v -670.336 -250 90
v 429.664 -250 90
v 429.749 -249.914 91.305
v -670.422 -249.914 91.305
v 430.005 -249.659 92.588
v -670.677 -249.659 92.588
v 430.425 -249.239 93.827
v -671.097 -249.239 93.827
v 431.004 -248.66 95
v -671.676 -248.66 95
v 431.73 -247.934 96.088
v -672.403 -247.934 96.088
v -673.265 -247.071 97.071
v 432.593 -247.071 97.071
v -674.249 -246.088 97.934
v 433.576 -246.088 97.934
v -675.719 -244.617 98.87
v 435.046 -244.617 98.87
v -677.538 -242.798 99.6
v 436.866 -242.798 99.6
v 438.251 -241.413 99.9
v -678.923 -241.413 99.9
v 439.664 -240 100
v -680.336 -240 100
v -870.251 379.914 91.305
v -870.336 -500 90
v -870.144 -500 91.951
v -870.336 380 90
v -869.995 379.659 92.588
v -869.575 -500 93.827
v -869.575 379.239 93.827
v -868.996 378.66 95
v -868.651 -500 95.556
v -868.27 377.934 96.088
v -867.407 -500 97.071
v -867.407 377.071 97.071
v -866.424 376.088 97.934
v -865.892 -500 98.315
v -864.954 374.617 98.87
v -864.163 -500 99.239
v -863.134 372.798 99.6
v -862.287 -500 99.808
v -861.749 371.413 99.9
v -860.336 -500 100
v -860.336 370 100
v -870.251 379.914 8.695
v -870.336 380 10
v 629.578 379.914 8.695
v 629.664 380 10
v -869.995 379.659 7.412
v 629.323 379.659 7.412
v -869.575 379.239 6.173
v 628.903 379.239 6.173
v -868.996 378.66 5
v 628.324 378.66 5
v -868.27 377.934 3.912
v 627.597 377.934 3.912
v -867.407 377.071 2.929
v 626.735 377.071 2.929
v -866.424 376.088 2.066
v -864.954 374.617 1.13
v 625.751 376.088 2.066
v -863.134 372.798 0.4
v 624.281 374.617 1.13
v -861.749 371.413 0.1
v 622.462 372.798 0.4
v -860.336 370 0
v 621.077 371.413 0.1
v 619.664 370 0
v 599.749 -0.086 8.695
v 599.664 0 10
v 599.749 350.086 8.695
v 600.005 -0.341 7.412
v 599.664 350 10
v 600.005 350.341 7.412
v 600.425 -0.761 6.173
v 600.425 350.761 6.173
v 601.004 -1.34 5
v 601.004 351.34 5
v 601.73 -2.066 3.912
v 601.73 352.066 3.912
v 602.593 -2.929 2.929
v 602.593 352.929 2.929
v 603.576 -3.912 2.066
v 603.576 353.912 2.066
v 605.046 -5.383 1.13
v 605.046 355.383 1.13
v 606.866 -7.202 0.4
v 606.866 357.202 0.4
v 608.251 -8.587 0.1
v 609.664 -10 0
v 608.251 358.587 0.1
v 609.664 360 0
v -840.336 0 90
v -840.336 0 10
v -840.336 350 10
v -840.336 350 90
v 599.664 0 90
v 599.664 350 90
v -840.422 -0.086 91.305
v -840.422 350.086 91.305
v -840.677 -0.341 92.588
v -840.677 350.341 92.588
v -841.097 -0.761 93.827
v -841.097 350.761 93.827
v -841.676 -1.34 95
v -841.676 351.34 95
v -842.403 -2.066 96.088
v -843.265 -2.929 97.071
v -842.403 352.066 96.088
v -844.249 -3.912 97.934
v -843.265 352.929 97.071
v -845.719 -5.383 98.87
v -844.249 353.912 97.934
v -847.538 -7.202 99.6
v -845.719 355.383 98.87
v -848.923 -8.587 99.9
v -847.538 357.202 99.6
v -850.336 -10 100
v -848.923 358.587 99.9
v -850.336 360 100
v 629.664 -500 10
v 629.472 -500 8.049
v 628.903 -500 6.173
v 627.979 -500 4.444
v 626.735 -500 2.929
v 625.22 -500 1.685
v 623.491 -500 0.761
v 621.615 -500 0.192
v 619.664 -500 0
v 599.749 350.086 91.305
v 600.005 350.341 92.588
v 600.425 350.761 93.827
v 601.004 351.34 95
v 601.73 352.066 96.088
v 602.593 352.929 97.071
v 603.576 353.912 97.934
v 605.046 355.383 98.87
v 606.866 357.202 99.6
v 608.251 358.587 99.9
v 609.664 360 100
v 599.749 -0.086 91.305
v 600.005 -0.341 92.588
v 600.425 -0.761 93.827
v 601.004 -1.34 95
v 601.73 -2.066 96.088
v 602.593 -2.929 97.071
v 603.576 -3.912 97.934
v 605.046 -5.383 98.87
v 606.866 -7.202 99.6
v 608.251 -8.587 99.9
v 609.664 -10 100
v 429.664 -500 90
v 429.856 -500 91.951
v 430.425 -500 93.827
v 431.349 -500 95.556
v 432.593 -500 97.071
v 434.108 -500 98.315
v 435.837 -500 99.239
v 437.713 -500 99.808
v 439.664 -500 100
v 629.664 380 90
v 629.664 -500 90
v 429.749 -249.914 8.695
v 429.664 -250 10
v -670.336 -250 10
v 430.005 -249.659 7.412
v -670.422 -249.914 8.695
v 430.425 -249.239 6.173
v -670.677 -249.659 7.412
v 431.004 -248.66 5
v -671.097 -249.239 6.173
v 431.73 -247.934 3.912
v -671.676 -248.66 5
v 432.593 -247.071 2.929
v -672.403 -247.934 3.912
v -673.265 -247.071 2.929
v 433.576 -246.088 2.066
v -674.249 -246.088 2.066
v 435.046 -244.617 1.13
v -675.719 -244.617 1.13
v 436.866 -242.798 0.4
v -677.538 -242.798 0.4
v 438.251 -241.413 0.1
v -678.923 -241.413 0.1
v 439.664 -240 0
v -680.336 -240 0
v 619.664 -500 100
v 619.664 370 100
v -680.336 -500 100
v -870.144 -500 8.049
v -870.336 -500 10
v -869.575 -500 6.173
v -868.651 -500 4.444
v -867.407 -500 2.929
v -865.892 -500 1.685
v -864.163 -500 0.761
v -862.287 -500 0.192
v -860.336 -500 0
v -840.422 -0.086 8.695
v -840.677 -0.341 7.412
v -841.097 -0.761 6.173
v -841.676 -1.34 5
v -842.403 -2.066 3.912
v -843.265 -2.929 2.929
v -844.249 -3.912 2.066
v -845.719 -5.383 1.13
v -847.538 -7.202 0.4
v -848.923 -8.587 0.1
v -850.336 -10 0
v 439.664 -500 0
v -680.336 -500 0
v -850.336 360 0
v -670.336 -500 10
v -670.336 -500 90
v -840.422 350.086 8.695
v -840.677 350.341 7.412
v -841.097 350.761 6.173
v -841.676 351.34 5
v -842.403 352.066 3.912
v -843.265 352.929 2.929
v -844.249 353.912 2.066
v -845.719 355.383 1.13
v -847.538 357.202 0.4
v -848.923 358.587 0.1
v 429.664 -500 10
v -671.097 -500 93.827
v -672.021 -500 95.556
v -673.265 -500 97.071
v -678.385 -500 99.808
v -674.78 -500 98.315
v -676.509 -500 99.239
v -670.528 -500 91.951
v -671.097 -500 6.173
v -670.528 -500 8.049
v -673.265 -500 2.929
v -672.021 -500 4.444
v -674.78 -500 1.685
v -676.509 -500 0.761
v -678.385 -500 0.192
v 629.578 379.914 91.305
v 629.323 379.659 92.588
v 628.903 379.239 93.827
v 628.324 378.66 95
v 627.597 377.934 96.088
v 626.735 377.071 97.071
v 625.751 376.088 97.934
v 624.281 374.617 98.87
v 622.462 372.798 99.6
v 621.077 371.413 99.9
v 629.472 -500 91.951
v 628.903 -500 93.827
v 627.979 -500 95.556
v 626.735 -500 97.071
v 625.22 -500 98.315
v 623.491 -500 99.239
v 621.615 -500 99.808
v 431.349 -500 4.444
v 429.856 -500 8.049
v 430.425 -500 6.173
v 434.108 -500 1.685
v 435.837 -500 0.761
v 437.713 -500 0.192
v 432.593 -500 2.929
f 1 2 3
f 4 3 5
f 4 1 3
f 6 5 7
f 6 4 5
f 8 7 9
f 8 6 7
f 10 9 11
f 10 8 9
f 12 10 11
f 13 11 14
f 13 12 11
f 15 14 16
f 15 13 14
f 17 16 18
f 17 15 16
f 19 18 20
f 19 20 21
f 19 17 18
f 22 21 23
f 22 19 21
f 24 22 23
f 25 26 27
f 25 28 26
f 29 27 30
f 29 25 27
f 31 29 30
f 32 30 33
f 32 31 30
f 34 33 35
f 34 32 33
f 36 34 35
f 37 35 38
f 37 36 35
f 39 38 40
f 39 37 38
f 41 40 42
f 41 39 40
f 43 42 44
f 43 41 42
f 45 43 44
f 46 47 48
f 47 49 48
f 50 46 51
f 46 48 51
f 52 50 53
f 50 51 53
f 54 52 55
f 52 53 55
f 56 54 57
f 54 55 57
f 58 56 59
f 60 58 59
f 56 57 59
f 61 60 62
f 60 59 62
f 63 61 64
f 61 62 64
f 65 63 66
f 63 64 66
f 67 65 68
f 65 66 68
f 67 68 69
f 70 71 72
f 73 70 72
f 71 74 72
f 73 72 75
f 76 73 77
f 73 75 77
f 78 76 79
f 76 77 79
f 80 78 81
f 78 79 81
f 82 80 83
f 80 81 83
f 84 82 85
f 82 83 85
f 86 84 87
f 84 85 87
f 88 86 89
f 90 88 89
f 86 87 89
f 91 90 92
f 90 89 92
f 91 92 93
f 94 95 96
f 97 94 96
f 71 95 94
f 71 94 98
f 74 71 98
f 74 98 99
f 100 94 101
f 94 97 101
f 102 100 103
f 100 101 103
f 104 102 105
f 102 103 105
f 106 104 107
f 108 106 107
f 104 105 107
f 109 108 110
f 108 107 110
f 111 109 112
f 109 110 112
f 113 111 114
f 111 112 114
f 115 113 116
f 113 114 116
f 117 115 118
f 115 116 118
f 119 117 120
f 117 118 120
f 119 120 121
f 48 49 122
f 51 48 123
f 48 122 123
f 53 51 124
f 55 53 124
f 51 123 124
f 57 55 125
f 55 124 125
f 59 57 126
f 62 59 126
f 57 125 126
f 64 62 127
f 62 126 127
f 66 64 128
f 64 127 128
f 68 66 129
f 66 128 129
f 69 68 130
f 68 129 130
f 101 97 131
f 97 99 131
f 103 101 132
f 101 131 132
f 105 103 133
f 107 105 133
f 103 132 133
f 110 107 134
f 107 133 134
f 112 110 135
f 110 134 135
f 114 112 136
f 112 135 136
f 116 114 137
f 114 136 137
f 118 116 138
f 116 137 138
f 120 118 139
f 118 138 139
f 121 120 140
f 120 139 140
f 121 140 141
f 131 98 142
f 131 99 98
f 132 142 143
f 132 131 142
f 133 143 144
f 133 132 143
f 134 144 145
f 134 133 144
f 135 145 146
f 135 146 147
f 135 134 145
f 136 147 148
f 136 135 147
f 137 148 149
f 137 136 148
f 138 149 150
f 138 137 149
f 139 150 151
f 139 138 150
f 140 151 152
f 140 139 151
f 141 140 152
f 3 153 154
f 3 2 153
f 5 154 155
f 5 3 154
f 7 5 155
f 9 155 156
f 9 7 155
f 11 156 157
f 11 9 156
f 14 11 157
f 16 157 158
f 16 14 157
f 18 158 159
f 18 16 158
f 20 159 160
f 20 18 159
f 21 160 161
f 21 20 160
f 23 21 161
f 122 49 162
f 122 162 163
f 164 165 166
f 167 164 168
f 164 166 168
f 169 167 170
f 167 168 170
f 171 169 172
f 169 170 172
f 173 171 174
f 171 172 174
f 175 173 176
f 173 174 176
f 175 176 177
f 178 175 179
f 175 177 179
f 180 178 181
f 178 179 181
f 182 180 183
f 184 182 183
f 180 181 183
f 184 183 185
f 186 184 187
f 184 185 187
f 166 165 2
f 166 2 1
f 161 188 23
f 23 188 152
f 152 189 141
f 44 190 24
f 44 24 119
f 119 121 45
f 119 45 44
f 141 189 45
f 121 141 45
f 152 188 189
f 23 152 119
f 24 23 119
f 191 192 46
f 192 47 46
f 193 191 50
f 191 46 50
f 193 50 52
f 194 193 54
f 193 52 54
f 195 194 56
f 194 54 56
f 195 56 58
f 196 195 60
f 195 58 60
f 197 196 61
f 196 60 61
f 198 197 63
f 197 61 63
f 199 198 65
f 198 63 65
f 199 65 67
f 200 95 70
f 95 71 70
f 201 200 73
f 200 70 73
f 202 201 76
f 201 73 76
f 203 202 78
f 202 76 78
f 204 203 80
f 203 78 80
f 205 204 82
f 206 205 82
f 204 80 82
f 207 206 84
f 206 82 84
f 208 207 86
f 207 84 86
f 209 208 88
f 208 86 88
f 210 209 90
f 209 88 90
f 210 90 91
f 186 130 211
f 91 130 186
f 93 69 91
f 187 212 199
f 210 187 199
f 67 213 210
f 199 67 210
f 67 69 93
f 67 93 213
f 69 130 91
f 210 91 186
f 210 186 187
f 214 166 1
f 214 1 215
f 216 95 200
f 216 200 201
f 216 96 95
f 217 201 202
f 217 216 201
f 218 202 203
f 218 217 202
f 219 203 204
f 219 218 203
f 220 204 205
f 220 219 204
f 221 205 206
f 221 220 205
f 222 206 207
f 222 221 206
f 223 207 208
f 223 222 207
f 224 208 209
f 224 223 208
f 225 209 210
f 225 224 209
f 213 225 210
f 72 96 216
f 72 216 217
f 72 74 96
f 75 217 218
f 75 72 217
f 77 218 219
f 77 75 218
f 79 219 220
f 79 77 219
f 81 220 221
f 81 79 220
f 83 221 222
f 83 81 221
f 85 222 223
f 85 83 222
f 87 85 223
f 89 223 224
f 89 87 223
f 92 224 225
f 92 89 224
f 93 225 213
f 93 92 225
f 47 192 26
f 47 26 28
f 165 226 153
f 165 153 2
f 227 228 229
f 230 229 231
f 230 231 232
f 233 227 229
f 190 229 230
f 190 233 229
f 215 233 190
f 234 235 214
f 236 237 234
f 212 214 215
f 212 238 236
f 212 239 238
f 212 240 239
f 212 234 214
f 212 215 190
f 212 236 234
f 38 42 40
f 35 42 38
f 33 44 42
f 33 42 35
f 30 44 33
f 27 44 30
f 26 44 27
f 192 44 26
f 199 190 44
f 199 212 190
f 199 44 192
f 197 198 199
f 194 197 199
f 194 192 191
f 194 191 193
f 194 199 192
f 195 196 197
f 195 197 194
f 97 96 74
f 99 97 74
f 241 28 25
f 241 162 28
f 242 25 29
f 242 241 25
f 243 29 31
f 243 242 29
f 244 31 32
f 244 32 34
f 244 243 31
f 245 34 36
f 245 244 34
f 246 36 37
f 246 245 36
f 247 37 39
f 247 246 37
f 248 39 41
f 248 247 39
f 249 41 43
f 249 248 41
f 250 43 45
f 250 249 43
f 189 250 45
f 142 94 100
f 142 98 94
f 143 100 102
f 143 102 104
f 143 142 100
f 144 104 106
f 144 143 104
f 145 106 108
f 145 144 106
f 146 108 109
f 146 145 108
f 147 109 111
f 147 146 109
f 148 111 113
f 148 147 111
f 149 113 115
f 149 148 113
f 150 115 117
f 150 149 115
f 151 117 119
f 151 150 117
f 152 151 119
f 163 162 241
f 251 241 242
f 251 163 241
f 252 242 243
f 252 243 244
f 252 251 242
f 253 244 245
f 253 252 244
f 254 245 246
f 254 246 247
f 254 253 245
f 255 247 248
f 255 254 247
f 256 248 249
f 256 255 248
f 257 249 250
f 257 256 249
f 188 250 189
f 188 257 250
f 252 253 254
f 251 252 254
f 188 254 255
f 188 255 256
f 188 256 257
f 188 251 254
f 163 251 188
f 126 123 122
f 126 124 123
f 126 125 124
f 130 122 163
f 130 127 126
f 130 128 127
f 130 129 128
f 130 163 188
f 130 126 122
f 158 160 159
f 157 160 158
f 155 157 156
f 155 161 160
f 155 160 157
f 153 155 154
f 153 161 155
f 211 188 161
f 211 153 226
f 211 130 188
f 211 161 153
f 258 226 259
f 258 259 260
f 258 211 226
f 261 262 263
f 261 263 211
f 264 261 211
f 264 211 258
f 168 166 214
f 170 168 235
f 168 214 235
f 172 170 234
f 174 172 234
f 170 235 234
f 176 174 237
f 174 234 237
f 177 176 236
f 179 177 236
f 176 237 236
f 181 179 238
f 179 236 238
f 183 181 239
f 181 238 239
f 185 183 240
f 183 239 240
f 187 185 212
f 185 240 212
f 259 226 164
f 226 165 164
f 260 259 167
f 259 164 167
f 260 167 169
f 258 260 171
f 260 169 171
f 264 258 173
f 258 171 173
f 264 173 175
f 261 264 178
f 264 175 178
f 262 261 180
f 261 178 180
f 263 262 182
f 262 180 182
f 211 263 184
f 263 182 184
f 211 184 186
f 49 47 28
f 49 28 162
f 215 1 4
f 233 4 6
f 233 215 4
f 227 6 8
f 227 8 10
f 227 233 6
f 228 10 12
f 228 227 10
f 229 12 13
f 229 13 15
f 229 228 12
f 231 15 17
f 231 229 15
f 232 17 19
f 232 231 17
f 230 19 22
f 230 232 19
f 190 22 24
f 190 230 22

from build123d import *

# Parameters (mm, degrees)
SKETCH1_W           = 1440
SKETCH1_H           = 350
BOSS_EXTRUDE1_DEPTH = 100
FILLET1_R           = 10


with BuildPart() as part:
    # Sketch1 → Boss-Extrude1 (new body)
    with BuildSketch(Plane.XY):
        Polygon((629.663880273, -500), (429.663880273, -500), (429.663880273, -250), (-670.336119727, -250), (-670.336119727, -500), (-870.336119727, -500), (-870.336119727, 380), (629.663880273, 380), align=None)
        with Locations((-120.336119727, 175)):
            Rectangle(SKETCH1_W, SKETCH1_H, mode=Mode.SUBTRACT)
    extrude(amount=BOSS_EXTRUDE1_DEPTH)

    # Fillet1
    fillet1_edges = [part.edges().sort_by_distance(p)[0] for p in [
        (429.663880273, -375, 0),
        (-120.336119727, -250, 0),
        (-670.336119727, -375, 0),
        (429.663880273, -375, 100),
        (629.663880273, -60, 100),
        (-840.336119727, 175, 0),
        (-120.336119727, 0, 0),
        (-120.336119727, 380, 100),
        (599.663880273, 175, 0),
        (-120.336119727, 350, 0),
        (-840.336119727, 175, 100),
        (-120.336119727, 0, 100),
        (599.663880273, 175, 100),
        (-120.336119727, 350, 100),
        (-870.336119727, -60, 100),
        (-670.336119727, -375, 100),
        (-120.336119727, -250, 100),
        (-870.336119727, -60, 0),
        (-120.336119727, 380, 0),
        (629.663880273, -60, 0),
    ]]
    fillet(fillet1_edges, radius=FILLET1_R)


solid = part.part
